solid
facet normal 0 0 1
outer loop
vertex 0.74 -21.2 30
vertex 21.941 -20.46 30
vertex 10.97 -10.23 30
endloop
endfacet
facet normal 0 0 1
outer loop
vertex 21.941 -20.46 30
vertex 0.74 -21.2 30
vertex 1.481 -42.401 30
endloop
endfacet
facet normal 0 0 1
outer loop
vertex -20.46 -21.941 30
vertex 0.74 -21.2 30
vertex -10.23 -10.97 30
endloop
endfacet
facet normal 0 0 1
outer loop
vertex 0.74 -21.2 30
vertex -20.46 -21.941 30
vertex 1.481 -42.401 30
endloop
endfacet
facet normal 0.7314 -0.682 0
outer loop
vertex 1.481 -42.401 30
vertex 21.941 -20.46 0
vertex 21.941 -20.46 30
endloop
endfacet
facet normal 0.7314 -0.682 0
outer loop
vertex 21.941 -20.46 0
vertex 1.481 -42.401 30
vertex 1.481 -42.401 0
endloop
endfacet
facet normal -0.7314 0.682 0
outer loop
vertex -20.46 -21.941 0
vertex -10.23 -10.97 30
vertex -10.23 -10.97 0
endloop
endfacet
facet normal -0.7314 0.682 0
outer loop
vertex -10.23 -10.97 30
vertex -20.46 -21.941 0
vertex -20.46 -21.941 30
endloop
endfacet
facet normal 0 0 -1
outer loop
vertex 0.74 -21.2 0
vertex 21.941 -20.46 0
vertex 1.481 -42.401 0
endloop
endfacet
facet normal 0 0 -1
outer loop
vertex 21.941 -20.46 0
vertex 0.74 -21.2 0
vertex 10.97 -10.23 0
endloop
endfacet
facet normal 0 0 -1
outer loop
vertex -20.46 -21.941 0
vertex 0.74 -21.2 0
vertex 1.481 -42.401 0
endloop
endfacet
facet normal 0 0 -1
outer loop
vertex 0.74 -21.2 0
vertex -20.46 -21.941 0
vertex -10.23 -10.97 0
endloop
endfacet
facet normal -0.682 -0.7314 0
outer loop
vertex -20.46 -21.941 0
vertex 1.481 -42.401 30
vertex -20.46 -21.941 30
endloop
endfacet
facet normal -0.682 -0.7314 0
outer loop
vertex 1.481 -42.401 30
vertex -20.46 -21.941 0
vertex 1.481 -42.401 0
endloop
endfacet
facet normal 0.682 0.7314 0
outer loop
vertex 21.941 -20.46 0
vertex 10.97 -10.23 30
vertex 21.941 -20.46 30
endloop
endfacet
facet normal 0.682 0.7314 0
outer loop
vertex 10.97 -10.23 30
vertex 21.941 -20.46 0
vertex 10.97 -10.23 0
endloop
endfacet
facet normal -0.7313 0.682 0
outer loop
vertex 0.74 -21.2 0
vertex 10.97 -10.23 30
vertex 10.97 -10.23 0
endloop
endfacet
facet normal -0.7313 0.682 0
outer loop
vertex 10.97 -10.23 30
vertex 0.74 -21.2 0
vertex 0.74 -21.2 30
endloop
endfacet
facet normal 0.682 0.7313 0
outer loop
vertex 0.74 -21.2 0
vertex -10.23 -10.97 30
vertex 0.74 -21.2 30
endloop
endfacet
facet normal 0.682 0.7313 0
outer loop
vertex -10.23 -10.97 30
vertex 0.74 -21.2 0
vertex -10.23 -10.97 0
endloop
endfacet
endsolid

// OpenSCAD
rotate([0,0,182])
rotate([0,-90,0]){
    difference(){
        rotate([-45,0,0]) {
            cube([30, 30, 30]);
        }
        scale([1,0.5,0.5]) {
            rotate([-45,0,0]) {
                cube([30, 30, 30]);
            }
        }
    }
}
